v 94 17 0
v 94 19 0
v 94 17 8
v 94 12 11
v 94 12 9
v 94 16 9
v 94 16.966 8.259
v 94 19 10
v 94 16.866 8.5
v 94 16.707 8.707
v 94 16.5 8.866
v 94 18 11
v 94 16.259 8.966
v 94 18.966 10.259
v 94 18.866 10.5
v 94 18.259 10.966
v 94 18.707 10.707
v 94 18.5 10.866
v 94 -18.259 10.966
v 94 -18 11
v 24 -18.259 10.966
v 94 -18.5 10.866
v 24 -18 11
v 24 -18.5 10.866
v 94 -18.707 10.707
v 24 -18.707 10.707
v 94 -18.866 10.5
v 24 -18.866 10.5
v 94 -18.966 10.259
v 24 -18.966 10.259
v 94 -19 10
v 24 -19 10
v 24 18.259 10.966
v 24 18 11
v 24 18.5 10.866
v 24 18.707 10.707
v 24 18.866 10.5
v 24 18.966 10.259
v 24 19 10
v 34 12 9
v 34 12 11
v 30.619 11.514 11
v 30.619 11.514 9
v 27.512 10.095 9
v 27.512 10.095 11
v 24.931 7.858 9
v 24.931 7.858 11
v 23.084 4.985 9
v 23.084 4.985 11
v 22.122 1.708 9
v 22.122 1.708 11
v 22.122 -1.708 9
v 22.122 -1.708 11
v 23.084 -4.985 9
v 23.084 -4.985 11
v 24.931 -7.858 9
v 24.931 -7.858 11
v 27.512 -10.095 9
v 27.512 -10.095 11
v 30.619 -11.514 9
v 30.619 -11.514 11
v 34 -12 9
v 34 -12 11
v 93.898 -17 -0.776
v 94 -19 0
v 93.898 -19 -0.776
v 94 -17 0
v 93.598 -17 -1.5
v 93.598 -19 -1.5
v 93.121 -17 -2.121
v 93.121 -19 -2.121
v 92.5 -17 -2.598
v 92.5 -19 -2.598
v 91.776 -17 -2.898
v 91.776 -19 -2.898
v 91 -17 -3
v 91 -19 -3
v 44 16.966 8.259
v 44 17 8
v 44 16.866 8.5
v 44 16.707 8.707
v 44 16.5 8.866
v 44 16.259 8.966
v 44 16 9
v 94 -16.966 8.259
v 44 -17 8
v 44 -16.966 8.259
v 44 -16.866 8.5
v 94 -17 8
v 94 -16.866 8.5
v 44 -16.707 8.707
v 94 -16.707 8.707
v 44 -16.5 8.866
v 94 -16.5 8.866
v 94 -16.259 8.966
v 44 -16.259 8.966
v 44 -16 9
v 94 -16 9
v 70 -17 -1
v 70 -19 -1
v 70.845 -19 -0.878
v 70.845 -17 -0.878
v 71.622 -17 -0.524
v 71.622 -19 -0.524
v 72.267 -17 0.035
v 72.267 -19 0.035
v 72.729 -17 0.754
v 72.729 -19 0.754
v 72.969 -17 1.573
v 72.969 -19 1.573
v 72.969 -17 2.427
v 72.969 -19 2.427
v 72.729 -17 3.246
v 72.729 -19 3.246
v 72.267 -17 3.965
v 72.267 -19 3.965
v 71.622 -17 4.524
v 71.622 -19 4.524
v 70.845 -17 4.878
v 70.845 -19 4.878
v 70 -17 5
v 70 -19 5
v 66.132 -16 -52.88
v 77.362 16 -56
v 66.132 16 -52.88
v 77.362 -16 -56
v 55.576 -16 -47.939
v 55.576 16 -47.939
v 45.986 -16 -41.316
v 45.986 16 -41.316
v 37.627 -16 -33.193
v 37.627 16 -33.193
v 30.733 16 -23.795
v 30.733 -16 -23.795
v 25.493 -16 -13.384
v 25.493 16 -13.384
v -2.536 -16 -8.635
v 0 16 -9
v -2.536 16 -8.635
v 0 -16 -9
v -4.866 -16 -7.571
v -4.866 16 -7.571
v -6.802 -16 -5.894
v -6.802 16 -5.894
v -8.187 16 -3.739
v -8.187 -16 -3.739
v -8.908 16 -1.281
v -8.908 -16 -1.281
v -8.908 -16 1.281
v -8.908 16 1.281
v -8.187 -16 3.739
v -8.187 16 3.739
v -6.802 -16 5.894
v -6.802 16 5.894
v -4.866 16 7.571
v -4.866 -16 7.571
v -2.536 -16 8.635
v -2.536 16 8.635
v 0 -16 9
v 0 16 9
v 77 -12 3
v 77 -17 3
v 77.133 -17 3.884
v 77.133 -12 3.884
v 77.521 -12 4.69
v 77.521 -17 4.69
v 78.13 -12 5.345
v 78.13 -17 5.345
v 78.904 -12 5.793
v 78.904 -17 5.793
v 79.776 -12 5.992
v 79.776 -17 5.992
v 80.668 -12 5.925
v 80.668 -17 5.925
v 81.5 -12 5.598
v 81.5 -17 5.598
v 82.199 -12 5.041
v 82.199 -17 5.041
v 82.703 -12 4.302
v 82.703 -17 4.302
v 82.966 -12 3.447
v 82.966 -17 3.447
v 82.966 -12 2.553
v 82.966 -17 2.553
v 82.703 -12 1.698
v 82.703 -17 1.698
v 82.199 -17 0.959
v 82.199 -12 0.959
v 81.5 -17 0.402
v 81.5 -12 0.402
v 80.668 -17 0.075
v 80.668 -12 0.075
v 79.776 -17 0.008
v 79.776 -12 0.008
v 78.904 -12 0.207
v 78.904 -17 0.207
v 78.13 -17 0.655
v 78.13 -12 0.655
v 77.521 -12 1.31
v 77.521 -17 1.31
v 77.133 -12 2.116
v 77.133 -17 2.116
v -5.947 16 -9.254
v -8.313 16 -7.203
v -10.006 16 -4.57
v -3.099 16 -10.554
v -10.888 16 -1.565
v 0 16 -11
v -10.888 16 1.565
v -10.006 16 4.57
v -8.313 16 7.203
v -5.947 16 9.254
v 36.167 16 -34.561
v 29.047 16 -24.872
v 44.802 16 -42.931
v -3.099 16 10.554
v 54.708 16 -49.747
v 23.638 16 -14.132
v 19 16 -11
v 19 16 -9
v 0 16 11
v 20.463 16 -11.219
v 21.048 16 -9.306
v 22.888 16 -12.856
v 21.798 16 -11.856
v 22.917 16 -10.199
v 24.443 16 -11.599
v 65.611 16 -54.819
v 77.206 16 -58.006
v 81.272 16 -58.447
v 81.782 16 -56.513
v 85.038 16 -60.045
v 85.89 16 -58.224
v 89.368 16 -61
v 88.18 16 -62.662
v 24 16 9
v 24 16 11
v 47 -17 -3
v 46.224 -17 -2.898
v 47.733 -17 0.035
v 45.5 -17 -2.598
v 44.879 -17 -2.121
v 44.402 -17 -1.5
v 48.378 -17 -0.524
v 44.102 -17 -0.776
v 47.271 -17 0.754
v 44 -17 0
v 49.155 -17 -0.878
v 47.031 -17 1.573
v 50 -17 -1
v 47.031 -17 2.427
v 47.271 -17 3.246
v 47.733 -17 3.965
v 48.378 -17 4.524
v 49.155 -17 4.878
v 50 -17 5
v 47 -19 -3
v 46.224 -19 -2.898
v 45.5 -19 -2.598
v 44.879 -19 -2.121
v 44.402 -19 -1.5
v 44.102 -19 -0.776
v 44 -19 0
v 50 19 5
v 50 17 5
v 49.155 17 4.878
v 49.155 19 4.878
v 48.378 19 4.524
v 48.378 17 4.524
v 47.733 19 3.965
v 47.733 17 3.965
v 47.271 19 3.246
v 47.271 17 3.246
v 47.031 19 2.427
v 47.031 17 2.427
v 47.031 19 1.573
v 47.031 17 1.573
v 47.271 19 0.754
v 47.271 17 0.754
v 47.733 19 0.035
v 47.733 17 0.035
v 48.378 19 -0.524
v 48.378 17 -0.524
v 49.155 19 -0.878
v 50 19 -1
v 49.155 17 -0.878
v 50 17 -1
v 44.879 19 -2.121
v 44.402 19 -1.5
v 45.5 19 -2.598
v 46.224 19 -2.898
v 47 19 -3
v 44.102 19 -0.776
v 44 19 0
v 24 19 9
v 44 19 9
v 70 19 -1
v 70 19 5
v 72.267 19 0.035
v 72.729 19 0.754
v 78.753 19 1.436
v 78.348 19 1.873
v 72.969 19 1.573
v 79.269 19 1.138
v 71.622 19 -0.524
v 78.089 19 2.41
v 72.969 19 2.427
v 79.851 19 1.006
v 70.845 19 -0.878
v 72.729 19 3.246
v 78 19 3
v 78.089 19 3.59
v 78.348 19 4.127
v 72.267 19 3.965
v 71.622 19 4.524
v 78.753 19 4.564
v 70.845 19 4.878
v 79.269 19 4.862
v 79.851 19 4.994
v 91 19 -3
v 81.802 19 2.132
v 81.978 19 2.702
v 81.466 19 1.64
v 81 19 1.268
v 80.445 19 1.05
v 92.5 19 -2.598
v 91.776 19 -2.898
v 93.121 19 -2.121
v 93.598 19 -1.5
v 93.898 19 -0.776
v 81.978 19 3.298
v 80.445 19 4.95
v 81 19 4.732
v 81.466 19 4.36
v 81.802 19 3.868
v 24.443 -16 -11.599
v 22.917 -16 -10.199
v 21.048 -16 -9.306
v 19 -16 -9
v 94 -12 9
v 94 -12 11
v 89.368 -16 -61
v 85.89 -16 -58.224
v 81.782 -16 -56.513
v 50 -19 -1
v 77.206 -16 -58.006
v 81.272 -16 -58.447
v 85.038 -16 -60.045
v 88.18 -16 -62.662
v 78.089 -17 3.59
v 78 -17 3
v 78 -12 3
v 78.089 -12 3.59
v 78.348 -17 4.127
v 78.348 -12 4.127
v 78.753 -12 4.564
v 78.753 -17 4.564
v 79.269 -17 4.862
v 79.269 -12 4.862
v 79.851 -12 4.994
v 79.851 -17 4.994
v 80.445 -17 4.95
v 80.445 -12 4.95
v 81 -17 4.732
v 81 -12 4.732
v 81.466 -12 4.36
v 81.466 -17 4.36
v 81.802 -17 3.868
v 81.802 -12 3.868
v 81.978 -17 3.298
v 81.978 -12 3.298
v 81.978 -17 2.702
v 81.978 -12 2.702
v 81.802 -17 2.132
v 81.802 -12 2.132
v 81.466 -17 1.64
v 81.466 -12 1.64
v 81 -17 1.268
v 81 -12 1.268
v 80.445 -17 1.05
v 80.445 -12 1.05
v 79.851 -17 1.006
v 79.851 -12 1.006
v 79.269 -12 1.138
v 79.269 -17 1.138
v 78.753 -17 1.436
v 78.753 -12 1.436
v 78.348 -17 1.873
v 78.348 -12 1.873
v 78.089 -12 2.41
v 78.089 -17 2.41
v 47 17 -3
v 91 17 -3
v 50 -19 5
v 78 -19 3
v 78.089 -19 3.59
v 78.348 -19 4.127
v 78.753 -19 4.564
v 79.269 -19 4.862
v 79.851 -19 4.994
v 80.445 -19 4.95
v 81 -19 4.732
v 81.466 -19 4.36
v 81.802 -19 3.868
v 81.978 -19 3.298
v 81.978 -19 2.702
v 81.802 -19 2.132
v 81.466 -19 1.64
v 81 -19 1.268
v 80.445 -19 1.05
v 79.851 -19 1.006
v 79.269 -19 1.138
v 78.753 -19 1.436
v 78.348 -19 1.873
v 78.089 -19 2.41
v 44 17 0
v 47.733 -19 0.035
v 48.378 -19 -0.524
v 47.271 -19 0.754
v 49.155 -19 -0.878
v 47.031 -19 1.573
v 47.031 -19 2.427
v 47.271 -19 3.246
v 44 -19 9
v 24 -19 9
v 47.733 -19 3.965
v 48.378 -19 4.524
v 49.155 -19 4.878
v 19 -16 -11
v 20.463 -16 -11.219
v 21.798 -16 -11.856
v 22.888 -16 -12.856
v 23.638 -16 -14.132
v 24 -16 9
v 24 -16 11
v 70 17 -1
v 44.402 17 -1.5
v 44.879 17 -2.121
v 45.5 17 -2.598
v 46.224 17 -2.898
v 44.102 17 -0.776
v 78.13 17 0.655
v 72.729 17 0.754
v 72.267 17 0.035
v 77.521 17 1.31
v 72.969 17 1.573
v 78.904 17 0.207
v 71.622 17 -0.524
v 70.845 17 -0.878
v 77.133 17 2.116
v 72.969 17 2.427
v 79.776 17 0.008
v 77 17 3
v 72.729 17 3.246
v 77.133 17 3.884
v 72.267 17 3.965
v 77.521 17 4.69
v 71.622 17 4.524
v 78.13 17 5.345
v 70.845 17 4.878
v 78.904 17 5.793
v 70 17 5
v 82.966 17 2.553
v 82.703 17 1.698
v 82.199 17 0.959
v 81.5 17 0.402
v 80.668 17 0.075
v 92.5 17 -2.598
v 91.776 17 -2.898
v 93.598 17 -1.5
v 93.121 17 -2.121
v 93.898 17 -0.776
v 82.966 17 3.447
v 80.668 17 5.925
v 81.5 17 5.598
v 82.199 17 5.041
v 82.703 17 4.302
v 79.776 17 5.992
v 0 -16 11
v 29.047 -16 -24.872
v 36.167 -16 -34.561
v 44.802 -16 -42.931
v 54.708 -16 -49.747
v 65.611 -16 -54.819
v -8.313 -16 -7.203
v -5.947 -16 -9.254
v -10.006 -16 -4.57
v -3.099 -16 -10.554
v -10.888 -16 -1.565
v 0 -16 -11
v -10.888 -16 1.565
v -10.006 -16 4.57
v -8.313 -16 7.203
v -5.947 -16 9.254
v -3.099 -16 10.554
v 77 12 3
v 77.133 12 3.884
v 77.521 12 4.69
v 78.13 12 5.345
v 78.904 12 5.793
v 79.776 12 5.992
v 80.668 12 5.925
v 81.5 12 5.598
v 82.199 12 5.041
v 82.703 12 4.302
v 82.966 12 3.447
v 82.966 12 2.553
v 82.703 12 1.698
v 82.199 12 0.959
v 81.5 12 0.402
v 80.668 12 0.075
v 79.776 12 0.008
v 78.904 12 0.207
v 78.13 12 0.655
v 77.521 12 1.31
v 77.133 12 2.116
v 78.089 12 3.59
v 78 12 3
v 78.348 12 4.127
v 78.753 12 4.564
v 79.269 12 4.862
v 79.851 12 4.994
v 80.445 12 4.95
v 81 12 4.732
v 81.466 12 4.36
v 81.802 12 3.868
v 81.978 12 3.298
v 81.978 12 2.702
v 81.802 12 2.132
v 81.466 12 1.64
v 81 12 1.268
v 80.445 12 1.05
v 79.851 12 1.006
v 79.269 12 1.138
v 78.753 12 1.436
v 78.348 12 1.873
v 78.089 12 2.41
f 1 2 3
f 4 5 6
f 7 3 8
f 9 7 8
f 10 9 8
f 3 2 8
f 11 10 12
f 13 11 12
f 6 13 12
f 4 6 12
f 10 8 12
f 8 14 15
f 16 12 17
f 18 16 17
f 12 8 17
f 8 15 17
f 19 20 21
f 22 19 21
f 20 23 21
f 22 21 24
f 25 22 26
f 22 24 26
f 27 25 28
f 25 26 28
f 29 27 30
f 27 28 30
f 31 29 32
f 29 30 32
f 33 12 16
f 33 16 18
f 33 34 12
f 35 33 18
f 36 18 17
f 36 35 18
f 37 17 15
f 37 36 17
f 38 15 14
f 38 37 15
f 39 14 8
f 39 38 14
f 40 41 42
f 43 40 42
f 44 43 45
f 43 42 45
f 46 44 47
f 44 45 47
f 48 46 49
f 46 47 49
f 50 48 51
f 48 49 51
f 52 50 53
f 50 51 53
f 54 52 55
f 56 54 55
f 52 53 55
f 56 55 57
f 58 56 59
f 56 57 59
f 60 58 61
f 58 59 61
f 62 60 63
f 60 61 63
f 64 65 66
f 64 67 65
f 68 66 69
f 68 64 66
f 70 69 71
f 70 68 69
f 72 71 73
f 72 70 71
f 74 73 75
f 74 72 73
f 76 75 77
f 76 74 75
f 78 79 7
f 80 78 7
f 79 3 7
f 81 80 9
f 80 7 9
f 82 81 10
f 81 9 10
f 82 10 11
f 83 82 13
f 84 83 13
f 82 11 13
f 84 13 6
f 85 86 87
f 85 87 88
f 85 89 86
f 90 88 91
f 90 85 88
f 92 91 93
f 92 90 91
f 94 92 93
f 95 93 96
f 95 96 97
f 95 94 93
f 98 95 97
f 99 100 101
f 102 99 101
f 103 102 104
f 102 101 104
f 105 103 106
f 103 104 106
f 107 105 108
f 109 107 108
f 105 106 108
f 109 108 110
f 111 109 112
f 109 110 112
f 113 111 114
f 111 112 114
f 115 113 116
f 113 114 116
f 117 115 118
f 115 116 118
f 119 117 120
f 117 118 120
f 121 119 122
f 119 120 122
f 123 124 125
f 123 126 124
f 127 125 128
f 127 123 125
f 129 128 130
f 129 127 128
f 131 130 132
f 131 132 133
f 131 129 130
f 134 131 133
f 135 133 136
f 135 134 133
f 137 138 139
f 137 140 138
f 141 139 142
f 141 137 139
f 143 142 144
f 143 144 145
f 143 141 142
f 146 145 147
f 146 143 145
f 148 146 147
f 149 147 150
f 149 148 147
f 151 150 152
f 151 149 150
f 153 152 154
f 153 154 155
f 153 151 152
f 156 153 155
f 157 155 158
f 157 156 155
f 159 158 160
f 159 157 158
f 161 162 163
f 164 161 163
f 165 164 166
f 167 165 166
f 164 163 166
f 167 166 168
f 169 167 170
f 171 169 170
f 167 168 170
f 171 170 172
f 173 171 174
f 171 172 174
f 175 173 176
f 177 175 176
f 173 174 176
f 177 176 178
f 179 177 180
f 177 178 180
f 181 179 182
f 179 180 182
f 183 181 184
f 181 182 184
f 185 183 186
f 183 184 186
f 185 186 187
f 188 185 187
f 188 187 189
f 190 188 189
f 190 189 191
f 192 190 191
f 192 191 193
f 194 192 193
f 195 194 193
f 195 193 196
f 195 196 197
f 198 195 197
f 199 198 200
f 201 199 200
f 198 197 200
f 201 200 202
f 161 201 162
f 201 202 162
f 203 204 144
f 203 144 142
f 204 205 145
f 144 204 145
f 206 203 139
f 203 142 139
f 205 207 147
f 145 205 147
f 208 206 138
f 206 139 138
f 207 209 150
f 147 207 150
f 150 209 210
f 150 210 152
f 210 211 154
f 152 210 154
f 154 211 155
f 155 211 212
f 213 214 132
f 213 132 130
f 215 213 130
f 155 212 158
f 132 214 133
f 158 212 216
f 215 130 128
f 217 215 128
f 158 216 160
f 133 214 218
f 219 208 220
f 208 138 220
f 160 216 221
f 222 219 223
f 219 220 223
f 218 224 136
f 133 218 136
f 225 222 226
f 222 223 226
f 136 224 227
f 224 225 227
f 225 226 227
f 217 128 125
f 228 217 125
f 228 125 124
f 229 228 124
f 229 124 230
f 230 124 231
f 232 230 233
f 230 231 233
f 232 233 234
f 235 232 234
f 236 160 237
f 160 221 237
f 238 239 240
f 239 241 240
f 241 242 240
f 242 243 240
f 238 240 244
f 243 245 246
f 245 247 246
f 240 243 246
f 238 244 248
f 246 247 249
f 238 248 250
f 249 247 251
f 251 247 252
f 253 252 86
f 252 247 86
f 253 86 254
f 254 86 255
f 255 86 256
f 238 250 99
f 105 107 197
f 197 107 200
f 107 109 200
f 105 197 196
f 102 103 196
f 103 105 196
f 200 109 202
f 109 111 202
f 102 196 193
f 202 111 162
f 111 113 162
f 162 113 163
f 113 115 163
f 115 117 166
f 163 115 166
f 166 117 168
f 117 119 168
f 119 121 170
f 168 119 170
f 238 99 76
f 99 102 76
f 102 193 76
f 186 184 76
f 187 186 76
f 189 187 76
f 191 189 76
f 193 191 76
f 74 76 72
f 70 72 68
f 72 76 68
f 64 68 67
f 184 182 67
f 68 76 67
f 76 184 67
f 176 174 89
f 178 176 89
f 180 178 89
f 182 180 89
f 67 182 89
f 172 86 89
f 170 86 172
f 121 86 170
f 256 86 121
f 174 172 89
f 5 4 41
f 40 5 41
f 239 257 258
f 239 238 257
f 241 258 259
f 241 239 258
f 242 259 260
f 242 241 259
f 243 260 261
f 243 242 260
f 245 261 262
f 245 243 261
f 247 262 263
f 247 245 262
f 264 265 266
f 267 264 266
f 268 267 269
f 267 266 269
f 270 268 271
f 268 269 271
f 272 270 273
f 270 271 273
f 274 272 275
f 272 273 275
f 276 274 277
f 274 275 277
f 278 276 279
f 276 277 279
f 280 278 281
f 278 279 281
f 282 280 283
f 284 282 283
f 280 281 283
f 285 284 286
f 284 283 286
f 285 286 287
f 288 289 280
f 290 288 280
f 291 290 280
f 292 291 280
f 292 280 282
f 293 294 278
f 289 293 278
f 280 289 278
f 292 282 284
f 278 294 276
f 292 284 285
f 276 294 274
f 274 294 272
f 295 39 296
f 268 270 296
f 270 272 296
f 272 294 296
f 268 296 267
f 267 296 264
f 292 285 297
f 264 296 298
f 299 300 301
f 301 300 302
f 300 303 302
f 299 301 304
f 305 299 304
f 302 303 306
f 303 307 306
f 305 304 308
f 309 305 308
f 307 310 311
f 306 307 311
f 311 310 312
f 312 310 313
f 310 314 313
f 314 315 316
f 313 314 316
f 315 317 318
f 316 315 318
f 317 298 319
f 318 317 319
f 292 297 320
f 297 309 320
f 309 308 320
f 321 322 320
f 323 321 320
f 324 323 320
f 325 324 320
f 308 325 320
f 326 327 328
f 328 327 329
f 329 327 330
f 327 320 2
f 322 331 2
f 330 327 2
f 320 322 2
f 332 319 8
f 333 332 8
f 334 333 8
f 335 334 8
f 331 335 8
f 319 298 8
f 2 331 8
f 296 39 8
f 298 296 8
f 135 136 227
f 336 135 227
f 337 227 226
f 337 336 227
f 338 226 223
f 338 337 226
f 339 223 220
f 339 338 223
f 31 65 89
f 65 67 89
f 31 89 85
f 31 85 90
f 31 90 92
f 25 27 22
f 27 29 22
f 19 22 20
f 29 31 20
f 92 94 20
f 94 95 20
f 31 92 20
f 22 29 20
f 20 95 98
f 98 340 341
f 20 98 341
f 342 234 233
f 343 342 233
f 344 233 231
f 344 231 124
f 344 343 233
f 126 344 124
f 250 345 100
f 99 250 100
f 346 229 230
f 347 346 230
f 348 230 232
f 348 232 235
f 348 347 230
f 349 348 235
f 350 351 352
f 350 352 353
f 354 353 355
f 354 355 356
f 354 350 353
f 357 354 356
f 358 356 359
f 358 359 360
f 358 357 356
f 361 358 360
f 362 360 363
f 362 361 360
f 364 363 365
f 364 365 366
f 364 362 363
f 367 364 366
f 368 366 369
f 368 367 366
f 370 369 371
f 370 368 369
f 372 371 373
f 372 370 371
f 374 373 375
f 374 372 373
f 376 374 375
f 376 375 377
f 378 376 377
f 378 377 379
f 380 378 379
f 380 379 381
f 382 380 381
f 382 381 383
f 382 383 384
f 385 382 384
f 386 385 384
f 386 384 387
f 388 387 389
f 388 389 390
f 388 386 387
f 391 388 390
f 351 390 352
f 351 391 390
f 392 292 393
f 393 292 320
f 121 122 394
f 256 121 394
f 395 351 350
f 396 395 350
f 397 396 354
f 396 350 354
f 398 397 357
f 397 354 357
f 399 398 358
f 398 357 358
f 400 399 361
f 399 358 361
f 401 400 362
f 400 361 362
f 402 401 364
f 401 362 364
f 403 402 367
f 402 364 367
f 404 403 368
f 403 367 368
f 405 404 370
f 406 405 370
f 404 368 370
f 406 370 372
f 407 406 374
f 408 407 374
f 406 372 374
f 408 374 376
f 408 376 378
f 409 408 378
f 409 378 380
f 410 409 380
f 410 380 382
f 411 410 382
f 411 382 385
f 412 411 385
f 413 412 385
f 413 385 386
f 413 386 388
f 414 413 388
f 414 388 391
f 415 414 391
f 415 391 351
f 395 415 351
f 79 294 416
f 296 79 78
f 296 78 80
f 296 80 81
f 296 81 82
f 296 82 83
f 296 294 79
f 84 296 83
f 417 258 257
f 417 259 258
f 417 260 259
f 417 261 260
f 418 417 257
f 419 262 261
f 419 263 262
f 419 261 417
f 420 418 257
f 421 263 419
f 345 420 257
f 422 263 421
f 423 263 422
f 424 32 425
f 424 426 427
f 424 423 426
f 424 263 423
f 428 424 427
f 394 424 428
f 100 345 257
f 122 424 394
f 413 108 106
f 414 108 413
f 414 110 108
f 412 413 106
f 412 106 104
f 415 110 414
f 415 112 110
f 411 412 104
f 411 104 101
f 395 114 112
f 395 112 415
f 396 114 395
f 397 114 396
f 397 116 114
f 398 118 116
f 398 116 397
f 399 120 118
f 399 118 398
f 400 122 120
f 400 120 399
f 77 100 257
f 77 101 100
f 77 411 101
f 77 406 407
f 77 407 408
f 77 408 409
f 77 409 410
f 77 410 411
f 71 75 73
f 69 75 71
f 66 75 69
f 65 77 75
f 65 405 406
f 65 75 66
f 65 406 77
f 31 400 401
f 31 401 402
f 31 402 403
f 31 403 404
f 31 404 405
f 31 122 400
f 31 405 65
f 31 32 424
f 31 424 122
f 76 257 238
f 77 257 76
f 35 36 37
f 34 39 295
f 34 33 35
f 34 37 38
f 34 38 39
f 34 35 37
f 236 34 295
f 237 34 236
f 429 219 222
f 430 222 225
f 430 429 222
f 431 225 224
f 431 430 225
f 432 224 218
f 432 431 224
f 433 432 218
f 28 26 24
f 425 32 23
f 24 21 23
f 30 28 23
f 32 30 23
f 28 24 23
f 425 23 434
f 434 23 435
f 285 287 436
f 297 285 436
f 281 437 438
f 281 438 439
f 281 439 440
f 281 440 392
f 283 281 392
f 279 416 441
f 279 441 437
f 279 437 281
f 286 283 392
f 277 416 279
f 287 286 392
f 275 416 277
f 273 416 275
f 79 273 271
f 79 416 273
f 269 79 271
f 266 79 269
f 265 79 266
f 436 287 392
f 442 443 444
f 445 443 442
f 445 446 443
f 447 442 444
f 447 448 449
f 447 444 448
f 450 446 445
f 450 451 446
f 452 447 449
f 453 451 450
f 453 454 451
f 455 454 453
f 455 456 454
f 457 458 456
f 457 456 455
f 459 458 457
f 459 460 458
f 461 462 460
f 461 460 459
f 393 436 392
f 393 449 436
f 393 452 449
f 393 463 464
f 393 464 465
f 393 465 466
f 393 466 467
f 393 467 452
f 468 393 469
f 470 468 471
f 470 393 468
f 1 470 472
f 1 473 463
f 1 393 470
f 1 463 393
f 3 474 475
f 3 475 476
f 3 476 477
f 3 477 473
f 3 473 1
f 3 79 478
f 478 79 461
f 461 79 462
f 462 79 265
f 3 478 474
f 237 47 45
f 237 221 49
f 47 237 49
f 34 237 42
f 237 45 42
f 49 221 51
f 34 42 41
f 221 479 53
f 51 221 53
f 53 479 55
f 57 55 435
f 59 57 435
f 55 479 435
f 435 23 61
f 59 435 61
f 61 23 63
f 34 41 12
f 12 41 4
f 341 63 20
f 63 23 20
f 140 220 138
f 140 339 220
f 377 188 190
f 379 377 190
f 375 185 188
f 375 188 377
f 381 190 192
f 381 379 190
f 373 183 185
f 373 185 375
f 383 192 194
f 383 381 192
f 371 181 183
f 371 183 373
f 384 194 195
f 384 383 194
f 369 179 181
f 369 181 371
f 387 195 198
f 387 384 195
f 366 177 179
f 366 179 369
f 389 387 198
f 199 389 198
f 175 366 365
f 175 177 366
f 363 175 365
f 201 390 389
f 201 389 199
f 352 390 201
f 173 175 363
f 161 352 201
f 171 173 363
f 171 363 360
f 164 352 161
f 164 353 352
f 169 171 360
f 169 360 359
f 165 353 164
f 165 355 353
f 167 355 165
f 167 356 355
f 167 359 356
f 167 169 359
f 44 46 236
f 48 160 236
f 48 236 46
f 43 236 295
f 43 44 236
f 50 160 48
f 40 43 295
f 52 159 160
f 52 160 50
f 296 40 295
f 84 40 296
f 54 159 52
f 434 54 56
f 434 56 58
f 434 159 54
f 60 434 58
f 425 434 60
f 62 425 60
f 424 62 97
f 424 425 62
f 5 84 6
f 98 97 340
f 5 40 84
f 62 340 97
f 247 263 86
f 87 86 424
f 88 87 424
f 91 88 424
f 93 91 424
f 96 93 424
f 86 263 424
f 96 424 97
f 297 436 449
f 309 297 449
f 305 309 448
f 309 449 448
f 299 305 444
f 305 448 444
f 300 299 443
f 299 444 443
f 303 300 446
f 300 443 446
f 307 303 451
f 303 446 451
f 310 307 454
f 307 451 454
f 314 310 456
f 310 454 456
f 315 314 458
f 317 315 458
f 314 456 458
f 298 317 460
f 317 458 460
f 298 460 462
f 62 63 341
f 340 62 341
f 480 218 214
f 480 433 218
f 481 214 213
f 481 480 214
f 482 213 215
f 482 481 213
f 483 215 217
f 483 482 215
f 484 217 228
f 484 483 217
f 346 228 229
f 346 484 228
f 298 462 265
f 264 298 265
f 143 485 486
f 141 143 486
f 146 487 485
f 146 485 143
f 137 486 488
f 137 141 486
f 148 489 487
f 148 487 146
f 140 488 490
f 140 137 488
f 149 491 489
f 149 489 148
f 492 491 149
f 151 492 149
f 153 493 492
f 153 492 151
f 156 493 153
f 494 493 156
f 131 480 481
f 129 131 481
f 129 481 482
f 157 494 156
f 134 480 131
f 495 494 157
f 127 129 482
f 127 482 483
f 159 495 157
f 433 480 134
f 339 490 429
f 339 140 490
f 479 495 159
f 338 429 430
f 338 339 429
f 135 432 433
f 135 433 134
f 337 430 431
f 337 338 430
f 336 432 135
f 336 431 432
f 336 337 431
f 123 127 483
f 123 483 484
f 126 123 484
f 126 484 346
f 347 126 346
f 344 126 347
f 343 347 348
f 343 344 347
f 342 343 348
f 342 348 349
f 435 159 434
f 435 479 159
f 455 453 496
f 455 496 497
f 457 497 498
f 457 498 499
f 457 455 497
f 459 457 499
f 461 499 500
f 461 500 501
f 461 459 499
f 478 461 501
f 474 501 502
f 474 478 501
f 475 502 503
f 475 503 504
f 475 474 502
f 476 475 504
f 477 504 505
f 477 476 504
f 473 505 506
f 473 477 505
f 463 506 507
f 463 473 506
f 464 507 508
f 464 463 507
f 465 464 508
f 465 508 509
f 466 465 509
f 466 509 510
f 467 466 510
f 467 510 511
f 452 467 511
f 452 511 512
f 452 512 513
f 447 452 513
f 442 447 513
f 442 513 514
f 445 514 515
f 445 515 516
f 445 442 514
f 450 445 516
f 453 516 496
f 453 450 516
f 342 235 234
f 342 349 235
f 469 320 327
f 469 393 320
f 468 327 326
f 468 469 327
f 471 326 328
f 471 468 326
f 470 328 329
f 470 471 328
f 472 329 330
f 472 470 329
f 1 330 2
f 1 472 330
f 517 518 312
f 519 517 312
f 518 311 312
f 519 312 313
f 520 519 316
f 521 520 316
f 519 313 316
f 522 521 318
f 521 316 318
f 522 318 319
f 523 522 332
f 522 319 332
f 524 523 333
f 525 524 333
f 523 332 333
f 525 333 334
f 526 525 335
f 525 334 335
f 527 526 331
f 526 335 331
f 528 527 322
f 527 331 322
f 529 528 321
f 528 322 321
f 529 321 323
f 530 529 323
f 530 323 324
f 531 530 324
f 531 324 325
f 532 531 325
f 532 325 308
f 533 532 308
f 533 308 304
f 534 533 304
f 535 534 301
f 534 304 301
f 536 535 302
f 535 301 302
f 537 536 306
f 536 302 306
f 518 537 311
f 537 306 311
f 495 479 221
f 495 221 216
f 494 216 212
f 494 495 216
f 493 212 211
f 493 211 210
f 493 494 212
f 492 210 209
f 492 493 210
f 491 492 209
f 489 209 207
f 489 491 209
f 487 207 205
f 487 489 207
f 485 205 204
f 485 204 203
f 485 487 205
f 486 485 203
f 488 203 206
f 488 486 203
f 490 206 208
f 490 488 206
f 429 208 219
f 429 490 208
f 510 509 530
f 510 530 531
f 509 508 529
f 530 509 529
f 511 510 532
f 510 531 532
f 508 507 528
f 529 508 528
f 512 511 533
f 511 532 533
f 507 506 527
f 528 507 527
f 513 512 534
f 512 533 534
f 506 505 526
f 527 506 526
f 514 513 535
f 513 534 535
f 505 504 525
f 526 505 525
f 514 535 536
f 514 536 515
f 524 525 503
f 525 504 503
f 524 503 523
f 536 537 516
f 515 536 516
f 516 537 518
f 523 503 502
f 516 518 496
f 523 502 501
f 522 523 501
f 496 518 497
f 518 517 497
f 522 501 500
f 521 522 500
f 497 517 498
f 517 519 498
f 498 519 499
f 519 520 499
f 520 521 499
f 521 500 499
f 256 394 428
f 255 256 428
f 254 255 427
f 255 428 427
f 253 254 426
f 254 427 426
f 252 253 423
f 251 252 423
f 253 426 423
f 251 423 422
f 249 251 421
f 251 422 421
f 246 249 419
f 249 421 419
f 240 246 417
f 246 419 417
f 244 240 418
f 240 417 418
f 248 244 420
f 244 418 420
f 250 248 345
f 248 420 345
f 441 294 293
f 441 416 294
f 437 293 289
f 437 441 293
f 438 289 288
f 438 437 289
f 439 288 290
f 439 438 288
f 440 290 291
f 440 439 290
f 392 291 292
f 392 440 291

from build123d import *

# Parameters (mm, degrees)
F1_DEPTH  = 16
F2_W      = 70
F2_H      = 3
F3_DEPTH  = 2
F4_W      = 50
F4_H      = 14
F5_DEPTH  = 2
F6_R      = 1
F9_DEPTH  = 2
F11_DEPTH = 38.001
F13_D     = 4
F14_R     = 3
F14_R_2   = 2
F15_DEPTH = 5
F16_R     = 3


# Not quite as in the source:
# - a pattern or mirror of a feature is missing from the dataset's text; its kind, count and spacing are read off the source's solid


with BuildPart() as f1:
    # F0 (on Front) → F1 (new body)
    with BuildSketch(Plane.XZ):
        with BuildLine():
            Line((94, 11), (0, 11))
            ThreePointArc((0, 11), (-11, 0), (0, -11))
            Line((0, -11), (19, -11))
            ThreePointArc((19, -11), (21.7981112342, -11.8562609251), (23.6378571429, -14.1317705916))
            ThreePointArc((23.6378571429, -14.1317705916), (44.801622976, -42.9310620406), (77.2062019292, -58.0057903986))
            ThreePointArc((77.2062019292, -58.0057903986), (83.2137047902, -59.1076967266), (88.1803617021, -62.6624973259))
            Line((88.1803617021, -62.6624973259), (89.3682949555, -61))
            ThreePointArc((89.3682949555, -61), (83.8961627896, -57.2250659611), (77.3621310458, -56))
            ThreePointArc((77.3621310458, -56), (45.985801942, -41.3156371935), (25.493, -13.3844788282))
            ThreePointArc((25.493, -13.3844788282), (22.9173557279, -10.1987652951), (19, -9))
            Line((19, -9), (0, -9))
            ThreePointArc((0, -9), (-9, 0), (0, 9))
            Line((0, 9), (94, 9))
            Line((94, 9), (94, 11))
        make_face()
    extrude(amount=F1_DEPTH)

    # F2 (on face) → F3 (join)
    with BuildSketch(Plane.XY.offset(11)):
        with Locations((59, -17.5)):
            Rectangle(F2_W, F2_H)
    extrude(amount=-F3_DEPTH)

    # F4 (on face) → F5 (join)
    with BuildSketch(Plane.XZ.offset(19)):
        with Locations((69, 4)):
            Rectangle(F4_W, F4_H)
    extrude(amount=-F5_DEPTH)

    # F6
    f6_edges = [f1.edges().sort_by_distance(p)[0] for p in [
        (59, -19, 11),
        (69, -17, 9),
    ]]
    fillet(f6_edges, radius=F6_R)

    # F7: F1 across plane


with BuildPart() as f1_1:
    add(f1.part)
    add(f1.part.mirror(Plane.XZ))

    # F8 (on face) → F9 (cut)
    with BuildSketch(Plane.XY.offset(11)):
        with BuildLine():
            Line((94, 12), (34, 12))
            ThreePointArc((34, 12), (22, 0), (34, -12))
            Line((34, -12), (94, -12))
            Line((94, -12), (94, 12))
        make_face()
    extrude(amount=-F9_DEPTH, mode=Mode.SUBTRACT)

    # F10 (on face) → F11 (cut, through all)
    with BuildSketch(Plane.XZ.offset(19)):
        with BuildLine():
            ThreePointArc((50, 5), (47, 2), (50, -1))
            Line((50, -1), (70, -1))
            ThreePointArc((70, -1), (73, 2), (70, 5))
            Line((70, 5), (50, 5))
        make_face()
    extrude(amount=-F11_DEPTH, mode=Mode.SUBTRACT)

    # F13 (through all)
    with Locations(Plane.XZ.offset(19)):
        with Locations((80, 3)):
            Hole(F13_D / 2)

    # F14 (on face) → F15 (join)
    with BuildSketch(Plane(origin=(0, -17, 0), x_dir=(-1, 0, 0), z_dir=(0, 1, 0))):
        with Locations((-80, 3)):
            Circle(F14_R)
        with Locations((-80, 3)):
            Circle(F14_R_2, mode=Mode.SUBTRACT)
    f15 = extrude(amount=F15_DEPTH)

    # F15_copies: F15 across plane
    add(f15.mirror(Plane.ZX))

    # F16
    f16_edges = [f1_1.edges().sort_by_distance(p)[0] for p in [
        (44, -18, -3),
        (44, 18, -3),
        (94, -18, -3),
        (94, 18, -3),
    ]]
    fillet(f16_edges, radius=F16_R)


solid = f1_1.part
